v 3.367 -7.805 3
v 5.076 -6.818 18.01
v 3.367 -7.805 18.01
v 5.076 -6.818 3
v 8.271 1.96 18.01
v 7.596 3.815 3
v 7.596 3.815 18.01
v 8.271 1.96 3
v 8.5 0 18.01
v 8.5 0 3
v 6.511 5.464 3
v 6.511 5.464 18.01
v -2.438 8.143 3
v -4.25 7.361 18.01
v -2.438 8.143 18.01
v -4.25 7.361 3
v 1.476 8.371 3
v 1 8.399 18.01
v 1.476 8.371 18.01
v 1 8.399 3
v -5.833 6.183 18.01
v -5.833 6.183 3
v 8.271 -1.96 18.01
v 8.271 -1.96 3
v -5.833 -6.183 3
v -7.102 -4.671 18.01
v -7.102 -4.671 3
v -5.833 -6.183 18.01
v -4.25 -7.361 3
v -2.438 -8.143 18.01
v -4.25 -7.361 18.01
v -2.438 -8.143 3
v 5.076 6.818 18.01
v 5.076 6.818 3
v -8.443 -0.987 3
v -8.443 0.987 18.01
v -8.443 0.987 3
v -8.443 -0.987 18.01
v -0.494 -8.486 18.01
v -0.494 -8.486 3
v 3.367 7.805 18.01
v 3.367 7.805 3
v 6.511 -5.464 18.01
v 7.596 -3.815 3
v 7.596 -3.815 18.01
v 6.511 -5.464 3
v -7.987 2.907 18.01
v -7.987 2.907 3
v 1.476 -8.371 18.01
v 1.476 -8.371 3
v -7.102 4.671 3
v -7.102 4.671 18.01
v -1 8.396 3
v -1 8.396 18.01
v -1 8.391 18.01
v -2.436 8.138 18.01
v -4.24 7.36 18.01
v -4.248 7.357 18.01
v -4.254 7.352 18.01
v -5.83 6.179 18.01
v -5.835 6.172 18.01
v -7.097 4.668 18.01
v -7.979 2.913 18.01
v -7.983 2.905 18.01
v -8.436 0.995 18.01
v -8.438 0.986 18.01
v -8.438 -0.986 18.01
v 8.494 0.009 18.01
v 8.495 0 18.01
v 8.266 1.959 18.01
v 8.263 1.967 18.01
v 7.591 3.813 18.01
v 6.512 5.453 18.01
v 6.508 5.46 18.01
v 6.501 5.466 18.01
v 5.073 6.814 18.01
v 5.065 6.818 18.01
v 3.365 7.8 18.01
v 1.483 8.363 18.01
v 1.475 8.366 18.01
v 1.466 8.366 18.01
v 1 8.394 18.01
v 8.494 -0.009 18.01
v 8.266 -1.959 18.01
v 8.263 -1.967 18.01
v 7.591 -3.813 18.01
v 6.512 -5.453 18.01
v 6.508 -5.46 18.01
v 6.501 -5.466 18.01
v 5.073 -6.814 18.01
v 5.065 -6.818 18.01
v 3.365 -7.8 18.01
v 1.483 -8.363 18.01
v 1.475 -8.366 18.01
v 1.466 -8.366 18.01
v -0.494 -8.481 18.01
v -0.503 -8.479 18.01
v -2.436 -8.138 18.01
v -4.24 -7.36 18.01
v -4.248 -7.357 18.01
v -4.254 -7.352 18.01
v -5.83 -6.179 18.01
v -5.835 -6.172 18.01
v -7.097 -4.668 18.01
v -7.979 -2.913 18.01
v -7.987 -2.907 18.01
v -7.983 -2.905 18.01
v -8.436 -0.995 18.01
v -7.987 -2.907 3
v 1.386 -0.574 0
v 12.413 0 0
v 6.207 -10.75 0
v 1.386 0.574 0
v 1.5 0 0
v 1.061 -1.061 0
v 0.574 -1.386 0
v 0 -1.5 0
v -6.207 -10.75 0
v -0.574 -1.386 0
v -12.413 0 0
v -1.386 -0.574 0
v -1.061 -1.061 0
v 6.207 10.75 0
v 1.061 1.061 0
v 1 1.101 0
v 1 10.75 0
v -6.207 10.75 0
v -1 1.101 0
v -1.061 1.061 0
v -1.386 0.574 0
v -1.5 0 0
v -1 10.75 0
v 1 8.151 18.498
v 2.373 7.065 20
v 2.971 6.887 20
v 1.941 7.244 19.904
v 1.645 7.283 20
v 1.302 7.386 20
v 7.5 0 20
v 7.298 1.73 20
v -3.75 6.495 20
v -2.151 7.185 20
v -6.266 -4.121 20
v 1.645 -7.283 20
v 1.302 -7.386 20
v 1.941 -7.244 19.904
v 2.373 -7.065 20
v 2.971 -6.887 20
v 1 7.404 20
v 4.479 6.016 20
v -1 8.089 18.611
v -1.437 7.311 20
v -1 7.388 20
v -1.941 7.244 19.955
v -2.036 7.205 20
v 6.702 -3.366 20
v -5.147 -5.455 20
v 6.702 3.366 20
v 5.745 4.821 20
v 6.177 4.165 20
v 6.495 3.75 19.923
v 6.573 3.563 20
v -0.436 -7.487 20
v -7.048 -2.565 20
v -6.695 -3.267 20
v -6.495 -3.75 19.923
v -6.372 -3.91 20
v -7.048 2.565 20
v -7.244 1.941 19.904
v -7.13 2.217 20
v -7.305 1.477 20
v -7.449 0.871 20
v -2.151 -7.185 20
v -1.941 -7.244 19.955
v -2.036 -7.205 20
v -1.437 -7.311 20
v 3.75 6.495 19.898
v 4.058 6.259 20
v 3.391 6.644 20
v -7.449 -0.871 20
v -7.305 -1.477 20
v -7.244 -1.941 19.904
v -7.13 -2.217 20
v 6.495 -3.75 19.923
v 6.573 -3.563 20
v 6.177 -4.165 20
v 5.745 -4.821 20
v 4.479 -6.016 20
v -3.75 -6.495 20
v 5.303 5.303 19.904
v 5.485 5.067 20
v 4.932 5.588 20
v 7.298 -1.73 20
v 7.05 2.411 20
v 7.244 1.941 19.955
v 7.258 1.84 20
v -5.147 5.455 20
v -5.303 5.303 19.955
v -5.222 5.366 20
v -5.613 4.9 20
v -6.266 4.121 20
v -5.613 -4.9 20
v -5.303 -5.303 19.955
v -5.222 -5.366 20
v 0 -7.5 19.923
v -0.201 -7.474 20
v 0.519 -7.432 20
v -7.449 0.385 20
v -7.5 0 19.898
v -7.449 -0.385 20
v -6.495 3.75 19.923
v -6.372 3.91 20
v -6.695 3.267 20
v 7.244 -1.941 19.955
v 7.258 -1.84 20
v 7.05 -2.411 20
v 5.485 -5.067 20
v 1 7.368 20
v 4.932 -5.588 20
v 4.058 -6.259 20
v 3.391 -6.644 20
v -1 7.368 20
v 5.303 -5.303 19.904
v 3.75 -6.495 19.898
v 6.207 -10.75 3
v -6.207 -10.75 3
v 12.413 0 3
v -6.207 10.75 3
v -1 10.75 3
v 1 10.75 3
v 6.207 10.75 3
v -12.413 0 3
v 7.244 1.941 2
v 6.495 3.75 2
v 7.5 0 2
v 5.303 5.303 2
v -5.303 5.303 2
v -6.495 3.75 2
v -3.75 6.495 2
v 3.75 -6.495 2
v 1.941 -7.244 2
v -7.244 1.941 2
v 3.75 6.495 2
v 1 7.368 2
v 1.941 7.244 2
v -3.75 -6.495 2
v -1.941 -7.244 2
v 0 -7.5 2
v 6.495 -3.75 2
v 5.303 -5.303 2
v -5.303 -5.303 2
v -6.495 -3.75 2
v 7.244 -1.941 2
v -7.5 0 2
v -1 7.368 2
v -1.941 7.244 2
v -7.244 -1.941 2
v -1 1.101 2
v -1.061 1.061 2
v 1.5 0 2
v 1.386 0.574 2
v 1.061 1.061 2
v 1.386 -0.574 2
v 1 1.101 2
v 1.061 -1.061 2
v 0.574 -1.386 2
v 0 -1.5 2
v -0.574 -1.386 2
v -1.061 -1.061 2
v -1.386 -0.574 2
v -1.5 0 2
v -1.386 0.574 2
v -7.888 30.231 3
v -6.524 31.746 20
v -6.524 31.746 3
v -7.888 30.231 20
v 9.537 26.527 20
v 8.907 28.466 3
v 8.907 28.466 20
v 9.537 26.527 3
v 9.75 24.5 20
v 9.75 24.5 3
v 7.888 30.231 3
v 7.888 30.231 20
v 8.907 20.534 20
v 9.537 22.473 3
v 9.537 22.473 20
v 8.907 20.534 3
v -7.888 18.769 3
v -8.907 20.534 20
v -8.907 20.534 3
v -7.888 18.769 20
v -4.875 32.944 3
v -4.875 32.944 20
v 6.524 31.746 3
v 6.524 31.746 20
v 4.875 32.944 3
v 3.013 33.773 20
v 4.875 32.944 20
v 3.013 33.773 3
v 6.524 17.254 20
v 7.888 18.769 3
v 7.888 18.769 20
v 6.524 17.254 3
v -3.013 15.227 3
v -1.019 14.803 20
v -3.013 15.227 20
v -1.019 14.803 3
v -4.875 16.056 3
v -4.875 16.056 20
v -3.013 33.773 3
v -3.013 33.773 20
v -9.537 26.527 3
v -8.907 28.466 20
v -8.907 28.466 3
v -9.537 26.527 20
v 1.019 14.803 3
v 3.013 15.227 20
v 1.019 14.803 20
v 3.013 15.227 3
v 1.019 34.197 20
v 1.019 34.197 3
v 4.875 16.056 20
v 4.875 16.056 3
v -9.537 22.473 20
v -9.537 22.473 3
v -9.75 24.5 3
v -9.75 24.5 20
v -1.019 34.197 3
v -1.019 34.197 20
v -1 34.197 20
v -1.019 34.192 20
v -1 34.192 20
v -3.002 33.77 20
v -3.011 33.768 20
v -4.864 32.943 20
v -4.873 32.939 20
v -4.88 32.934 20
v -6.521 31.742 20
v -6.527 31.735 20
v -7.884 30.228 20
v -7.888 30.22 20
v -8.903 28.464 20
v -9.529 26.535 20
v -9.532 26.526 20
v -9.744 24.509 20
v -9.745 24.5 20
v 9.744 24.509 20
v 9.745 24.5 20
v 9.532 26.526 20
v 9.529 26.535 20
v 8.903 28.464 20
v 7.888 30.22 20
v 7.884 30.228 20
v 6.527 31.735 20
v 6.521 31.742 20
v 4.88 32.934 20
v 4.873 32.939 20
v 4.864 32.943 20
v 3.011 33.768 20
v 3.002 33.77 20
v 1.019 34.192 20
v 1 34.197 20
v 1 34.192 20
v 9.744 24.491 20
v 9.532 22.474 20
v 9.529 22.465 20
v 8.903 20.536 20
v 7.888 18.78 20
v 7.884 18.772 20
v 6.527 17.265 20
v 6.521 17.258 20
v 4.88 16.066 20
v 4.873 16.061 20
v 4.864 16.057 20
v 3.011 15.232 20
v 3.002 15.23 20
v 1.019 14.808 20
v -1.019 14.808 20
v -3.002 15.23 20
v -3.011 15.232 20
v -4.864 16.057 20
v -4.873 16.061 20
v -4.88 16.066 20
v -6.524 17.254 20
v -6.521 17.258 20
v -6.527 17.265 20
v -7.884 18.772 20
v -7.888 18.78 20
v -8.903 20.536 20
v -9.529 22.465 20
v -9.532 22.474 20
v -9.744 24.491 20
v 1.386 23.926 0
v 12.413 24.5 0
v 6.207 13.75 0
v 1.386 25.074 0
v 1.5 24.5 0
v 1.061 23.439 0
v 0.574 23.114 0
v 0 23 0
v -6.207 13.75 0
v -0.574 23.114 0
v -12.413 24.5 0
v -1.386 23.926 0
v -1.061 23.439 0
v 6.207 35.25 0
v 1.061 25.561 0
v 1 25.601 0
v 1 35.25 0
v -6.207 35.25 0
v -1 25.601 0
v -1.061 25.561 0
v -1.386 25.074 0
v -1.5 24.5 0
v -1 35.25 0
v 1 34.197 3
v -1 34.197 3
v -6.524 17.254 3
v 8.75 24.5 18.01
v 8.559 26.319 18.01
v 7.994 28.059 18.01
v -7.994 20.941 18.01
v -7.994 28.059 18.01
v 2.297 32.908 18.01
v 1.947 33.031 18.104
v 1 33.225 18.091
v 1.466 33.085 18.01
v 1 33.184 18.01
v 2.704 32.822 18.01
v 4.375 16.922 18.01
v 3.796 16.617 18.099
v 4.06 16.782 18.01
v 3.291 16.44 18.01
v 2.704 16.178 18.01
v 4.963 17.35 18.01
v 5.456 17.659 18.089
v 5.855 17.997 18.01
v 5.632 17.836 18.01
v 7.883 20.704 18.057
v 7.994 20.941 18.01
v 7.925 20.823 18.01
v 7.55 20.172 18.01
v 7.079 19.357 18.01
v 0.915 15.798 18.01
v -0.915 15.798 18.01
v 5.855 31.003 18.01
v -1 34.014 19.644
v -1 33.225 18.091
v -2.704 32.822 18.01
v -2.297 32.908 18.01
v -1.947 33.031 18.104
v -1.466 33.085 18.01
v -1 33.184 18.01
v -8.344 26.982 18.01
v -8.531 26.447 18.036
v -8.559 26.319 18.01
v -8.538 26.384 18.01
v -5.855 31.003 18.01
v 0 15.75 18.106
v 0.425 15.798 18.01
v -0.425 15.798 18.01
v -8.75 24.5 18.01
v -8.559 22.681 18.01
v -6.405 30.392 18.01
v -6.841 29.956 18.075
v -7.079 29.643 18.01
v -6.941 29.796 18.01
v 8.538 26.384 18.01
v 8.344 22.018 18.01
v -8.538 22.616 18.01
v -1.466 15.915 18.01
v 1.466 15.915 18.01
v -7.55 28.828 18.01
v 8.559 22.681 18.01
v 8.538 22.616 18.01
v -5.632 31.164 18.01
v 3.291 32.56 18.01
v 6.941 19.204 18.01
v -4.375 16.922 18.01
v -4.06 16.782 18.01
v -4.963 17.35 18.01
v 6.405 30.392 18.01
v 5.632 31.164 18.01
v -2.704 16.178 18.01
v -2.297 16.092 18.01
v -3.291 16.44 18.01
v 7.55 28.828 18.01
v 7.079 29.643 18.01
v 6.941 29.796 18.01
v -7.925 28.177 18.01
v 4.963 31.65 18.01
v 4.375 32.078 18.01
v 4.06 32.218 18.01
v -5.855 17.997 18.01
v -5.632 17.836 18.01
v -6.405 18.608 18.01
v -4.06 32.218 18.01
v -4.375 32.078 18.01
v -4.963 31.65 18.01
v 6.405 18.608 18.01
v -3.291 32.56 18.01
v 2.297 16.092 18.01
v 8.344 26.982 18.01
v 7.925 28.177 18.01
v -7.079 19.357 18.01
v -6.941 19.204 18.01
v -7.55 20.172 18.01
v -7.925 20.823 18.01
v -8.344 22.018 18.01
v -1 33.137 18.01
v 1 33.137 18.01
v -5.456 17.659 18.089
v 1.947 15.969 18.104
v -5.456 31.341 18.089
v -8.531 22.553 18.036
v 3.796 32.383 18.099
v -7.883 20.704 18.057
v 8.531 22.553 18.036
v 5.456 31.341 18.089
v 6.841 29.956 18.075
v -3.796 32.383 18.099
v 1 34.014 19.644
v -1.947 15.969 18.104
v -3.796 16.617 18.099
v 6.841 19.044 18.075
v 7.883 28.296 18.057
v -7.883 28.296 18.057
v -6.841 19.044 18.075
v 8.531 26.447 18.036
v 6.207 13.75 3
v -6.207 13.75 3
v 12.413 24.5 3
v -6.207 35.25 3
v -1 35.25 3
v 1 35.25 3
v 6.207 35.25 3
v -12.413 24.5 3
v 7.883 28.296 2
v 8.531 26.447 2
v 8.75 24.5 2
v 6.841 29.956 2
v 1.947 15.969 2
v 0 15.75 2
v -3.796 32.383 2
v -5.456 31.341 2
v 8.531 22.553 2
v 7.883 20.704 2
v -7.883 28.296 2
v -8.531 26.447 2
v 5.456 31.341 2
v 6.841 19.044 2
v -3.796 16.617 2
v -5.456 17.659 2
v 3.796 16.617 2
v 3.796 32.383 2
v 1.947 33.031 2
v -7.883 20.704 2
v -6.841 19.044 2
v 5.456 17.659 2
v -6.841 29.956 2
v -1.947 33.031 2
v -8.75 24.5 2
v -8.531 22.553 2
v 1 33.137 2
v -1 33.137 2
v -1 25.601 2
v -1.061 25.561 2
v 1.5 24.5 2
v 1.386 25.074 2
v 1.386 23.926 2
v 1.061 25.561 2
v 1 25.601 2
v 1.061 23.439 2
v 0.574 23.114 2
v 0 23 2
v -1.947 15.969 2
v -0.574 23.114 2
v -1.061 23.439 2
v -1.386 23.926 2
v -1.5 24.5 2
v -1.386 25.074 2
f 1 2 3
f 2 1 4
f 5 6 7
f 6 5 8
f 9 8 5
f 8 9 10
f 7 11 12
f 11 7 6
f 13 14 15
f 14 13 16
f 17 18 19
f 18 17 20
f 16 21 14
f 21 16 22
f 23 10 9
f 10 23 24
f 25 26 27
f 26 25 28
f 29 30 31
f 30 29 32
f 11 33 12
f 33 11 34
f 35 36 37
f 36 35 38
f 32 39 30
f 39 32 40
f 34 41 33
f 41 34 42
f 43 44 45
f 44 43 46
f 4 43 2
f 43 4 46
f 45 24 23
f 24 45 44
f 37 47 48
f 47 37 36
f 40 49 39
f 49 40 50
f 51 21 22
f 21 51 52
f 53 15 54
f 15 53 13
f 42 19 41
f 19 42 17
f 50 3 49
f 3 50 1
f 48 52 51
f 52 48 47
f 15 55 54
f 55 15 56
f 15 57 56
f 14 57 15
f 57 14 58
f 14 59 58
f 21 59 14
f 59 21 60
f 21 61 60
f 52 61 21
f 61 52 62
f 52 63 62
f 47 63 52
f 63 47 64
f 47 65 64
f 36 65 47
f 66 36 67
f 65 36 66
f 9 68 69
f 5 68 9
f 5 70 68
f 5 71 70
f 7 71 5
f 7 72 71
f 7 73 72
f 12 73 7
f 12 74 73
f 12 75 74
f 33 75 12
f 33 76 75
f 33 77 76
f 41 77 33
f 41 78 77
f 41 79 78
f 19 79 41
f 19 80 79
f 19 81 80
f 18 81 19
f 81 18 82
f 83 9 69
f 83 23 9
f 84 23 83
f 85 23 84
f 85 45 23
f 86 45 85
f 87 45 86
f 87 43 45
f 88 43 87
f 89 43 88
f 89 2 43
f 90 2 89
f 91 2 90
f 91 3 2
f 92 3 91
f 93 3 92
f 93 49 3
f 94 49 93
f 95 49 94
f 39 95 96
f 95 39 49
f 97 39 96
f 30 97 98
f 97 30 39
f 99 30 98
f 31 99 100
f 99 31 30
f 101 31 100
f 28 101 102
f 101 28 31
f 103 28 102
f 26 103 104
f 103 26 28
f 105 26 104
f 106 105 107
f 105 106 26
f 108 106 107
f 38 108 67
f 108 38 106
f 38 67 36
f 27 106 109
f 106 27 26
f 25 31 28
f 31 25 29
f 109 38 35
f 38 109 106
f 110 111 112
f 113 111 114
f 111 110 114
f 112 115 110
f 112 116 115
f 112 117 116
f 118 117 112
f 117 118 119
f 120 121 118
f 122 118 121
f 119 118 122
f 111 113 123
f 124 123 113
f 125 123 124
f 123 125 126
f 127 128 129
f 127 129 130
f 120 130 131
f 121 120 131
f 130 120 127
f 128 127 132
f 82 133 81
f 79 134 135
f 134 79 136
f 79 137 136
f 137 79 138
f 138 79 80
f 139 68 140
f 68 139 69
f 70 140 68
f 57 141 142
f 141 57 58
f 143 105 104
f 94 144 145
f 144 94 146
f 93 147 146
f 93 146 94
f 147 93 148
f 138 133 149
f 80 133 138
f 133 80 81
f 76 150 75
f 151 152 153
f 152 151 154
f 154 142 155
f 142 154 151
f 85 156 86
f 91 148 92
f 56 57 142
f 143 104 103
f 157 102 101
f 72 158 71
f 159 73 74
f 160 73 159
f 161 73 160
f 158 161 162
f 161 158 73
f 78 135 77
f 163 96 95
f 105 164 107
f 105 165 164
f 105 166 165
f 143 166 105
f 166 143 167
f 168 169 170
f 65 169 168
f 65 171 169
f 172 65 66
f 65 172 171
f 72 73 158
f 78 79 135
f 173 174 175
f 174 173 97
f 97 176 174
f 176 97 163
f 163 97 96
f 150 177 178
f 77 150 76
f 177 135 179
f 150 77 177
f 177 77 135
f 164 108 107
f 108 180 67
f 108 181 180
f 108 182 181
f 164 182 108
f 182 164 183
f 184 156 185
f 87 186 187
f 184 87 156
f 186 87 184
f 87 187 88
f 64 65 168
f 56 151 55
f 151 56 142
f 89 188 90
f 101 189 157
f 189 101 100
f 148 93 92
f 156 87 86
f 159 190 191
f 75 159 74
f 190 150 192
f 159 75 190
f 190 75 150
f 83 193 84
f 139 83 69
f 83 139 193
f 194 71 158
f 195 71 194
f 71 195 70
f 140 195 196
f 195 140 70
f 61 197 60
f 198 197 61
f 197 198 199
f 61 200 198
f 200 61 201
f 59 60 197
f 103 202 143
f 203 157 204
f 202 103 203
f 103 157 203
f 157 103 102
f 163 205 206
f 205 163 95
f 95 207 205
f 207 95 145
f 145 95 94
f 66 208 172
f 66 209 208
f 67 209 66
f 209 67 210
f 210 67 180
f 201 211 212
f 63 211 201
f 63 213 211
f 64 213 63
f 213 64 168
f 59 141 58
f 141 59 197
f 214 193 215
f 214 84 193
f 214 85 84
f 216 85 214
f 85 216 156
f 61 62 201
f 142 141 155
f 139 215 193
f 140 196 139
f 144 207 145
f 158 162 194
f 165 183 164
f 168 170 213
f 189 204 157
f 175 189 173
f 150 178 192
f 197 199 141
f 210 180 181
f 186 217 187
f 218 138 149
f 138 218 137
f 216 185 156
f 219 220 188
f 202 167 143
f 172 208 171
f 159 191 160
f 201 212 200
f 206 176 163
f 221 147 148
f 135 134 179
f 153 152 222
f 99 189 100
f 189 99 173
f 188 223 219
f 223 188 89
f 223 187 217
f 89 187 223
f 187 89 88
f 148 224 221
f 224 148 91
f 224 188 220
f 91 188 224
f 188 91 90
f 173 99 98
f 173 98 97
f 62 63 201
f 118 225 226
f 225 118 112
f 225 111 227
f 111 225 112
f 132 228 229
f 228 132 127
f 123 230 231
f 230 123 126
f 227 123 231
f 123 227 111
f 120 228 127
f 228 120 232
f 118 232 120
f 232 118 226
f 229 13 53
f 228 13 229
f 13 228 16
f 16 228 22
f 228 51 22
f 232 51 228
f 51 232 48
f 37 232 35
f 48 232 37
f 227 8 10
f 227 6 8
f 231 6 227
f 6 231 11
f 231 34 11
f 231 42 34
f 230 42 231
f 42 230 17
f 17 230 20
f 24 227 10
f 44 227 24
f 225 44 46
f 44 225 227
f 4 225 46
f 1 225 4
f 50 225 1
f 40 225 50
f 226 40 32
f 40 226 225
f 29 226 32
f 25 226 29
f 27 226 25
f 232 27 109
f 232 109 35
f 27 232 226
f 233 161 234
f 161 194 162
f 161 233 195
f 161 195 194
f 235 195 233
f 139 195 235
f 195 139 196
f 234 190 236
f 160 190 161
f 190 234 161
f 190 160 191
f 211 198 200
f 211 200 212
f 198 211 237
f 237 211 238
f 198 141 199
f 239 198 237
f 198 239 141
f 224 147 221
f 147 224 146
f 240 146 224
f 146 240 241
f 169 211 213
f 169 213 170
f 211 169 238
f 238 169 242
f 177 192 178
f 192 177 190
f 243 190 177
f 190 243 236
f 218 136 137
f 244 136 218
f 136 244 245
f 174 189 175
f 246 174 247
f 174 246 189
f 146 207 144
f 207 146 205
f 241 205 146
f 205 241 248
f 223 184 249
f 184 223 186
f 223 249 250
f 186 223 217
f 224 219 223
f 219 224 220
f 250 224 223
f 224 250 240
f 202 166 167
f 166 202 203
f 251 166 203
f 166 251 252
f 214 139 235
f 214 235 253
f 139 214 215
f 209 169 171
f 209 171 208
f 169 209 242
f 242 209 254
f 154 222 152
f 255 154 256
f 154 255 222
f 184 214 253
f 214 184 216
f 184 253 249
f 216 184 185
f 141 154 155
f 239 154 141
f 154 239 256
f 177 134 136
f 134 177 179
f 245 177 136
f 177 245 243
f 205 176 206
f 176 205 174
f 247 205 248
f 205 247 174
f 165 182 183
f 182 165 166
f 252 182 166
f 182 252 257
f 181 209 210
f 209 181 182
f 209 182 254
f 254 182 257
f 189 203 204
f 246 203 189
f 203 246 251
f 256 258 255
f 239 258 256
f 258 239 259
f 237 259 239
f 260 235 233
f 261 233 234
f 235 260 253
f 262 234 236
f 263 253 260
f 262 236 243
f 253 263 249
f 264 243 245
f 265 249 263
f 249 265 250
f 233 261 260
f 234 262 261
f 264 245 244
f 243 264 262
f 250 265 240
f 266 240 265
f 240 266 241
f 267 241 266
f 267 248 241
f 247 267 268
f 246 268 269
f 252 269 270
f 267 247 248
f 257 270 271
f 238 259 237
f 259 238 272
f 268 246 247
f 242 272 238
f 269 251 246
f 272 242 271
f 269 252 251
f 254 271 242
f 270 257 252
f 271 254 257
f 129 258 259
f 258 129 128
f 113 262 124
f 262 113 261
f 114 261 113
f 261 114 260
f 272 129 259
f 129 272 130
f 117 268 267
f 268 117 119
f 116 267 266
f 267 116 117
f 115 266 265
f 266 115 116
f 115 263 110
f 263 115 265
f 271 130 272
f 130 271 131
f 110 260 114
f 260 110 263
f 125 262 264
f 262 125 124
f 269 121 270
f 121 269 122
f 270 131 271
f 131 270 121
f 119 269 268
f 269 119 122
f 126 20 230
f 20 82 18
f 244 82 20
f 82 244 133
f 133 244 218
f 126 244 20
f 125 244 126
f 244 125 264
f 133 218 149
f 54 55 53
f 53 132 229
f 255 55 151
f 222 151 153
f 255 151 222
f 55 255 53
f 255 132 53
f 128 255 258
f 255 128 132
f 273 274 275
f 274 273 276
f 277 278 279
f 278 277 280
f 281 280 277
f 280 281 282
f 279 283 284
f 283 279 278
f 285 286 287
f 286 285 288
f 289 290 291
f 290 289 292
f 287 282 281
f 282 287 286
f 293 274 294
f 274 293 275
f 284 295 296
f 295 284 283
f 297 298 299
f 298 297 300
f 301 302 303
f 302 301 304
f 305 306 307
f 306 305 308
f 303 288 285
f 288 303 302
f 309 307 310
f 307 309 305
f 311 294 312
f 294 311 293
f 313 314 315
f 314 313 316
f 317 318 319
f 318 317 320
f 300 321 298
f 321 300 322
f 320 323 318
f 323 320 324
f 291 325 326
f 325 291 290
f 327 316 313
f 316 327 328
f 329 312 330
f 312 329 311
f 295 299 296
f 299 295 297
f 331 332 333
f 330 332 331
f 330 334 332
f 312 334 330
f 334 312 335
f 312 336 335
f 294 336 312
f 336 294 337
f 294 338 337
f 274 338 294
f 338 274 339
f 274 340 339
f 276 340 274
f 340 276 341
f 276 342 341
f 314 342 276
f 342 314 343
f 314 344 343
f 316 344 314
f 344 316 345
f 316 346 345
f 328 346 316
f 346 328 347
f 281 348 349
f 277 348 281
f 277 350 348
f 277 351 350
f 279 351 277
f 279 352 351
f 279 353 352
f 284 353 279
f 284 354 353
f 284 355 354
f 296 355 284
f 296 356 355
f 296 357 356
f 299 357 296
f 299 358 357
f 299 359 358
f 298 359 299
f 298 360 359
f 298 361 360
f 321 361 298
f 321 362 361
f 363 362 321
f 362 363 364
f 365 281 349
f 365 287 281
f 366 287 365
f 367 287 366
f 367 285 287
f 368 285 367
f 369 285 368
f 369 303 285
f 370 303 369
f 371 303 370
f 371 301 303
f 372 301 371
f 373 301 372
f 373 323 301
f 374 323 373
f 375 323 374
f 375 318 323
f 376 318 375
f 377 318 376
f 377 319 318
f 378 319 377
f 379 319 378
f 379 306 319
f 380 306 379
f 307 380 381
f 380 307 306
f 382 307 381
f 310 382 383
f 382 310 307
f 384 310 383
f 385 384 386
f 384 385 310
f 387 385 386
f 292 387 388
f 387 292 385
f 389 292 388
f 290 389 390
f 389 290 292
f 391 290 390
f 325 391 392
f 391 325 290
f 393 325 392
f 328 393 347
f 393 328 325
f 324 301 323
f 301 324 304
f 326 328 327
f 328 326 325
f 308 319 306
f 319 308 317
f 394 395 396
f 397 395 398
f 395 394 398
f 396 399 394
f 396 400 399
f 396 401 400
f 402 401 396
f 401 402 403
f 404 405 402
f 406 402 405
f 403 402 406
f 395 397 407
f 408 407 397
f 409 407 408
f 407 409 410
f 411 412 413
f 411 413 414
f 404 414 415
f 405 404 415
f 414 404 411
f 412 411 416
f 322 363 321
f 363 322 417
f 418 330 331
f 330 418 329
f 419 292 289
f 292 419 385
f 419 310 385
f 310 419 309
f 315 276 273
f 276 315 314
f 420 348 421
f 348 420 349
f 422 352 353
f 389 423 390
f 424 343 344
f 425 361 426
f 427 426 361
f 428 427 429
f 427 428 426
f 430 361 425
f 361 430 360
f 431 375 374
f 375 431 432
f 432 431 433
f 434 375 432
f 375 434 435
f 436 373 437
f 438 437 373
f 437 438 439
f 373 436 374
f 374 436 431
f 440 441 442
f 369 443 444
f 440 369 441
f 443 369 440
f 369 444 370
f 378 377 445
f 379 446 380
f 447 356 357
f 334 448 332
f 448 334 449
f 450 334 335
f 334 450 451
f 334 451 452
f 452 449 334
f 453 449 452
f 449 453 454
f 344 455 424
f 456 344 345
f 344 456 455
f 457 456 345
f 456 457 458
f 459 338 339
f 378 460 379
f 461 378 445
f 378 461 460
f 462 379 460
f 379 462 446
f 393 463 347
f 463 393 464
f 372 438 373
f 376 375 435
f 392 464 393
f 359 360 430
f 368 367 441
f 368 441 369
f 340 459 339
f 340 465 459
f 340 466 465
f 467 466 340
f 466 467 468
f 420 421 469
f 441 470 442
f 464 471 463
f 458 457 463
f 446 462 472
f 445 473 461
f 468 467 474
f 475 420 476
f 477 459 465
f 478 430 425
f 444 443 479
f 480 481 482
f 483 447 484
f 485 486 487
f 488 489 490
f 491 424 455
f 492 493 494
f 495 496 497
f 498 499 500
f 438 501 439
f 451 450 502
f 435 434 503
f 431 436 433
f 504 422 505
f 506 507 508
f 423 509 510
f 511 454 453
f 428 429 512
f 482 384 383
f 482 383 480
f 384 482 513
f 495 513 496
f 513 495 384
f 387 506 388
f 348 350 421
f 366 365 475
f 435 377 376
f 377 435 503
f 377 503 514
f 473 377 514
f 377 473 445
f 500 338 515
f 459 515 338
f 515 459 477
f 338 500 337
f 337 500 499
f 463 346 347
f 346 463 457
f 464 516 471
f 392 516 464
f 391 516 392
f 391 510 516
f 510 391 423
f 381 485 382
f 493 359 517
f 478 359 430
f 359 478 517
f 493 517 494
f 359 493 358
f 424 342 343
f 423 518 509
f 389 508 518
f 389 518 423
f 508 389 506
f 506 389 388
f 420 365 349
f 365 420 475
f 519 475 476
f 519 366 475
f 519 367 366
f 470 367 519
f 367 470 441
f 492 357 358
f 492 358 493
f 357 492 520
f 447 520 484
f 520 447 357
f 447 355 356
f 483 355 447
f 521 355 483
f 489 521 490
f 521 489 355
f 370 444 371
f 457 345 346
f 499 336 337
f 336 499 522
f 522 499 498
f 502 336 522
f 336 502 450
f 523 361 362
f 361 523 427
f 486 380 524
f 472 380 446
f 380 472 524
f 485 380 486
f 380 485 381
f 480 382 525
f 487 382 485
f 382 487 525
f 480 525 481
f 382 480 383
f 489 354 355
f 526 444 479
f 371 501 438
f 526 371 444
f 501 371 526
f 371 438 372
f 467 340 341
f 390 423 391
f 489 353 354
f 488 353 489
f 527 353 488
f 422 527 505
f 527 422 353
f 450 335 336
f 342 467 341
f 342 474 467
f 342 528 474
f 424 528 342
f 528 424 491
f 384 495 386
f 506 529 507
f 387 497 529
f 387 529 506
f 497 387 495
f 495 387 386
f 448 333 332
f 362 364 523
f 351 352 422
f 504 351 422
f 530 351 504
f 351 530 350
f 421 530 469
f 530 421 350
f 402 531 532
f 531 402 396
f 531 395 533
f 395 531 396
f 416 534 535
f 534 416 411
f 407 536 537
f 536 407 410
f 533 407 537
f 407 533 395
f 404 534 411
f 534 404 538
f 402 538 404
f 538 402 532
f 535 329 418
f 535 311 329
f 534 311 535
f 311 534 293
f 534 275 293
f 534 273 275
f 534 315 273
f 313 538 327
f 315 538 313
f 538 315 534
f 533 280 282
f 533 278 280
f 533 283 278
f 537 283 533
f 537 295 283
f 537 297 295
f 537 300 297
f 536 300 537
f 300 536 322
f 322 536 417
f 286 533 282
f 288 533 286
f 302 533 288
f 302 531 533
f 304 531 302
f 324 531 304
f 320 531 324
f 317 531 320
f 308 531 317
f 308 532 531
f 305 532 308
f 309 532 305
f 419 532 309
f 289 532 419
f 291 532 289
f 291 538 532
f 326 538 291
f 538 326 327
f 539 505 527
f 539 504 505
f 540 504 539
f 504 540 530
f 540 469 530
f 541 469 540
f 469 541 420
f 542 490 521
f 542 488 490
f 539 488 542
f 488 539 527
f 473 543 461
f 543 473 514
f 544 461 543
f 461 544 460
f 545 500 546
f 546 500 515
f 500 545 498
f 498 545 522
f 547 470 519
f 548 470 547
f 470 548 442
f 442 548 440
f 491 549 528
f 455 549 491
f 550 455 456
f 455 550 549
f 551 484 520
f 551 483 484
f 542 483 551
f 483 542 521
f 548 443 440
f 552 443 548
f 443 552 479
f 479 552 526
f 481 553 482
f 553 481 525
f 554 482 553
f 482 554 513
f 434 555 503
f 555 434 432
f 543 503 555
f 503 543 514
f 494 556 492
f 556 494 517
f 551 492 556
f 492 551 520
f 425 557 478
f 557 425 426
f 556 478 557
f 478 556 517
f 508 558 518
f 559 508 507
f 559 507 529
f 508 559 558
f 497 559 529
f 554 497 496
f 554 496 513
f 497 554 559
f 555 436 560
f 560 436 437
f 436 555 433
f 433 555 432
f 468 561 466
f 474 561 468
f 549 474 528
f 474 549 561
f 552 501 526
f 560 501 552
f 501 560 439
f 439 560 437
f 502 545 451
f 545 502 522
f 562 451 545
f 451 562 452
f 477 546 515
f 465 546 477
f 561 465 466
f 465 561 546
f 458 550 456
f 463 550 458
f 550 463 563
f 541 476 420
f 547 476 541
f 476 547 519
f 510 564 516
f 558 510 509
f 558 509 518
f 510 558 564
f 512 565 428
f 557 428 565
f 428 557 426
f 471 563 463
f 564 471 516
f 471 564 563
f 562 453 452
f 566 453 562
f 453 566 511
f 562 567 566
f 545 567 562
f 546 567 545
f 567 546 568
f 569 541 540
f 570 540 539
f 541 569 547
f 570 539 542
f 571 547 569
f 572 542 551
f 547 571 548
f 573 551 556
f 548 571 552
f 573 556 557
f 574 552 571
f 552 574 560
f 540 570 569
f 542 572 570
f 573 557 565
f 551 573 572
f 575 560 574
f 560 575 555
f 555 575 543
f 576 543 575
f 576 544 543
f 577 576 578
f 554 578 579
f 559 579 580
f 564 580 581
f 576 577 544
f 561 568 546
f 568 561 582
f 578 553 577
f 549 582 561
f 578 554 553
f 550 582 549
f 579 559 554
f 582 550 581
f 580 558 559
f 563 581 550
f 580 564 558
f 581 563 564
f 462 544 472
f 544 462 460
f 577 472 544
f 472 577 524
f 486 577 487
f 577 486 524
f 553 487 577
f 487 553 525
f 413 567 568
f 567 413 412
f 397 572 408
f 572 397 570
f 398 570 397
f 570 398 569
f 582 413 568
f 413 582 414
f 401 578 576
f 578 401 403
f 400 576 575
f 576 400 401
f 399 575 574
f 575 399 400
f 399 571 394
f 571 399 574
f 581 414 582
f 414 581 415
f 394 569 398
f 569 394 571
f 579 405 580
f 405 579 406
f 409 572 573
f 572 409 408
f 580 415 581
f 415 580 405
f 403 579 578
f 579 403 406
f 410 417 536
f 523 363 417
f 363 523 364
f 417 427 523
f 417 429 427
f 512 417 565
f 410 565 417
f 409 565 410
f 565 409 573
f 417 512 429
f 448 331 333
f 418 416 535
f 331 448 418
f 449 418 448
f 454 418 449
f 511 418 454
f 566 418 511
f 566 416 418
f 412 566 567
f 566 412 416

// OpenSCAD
wallThickness = 1;
length = 20;
innerDiameterOfInnerCylinder = 15;
tolerance = 0.25;
hexStickout = 1;
hexHeight = 3;
hole = 3;
baseThickness = 2;
slitSize = 2;

module dummy() {}

nudge = 0.01;
id1 = innerDiameterOfInnerCylinder;
od1 = innerDiameterOfInnerCylinder+2*wallThickness;
id2 = od1+2*tolerance;
od2 = id2+2*wallThickness;
hexID = od2+hexStickout*2;
hexOD = hexID / cos(180/6);

module taperedCylinder(d=10,h=10,taper=2,taperRatio=2) {
    if (taper>0) {
        cylinder(d=d,h=h-taper*taperRatio+nudge);
        translate([0,0,h-taper*taperRatio]) cylinder(d1=d,d2=d-2*taper,h=taper*taperRatio);
    }
    else {
        difference(){
            cylinder(d=d,h=h);
            translate([0,0,h+taper*taperRatio+nudge]) cylinder(d1=d+2*taper,d2=d,h=-taper*taperRatio);
        }
    }
}

module hexRing() {
    cylinder(d=hexOD,h=hexHeight,$fn=6);
}

module inner() {
    render(convexity=1)
    difference() {
        union() {
            taperedCylinder(d=od1,h=length,taper=wallThickness);
            hexRing();
        }
        translate([0,0,baseThickness]) cylinder(d=id1,h=length);
        translate([0,0,-nudge])
        cylinder(d=hole,h=baseThickness+2*nudge,$fn=16);
        if (slitSize)
        translate([-slitSize/2,0,-nudge]) 
        cube([slitSize,od2*2,baseThickness+length+2*nudge]);
    }
}

module outer() {
    render(convexity=1)
    difference() {
        union() {
            taperedCylinder(d=od2,h=length,taper=-wallThickness);
            hexRing();
        }
        translate([0,0,baseThickness]) cylinder(d=id2,h=length);
        translate([0,0,-nudge]) 
        cylinder(d=hole,h=baseThickness+2*nudge,$fn=16);
        if (slitSize)
        translate([-slitSize/2,0,-nudge]) 
        cube([slitSize,od2*2,baseThickness+length+2*nudge]);
    }
}

inner();
translate([0,od2+5,0]) outer();
